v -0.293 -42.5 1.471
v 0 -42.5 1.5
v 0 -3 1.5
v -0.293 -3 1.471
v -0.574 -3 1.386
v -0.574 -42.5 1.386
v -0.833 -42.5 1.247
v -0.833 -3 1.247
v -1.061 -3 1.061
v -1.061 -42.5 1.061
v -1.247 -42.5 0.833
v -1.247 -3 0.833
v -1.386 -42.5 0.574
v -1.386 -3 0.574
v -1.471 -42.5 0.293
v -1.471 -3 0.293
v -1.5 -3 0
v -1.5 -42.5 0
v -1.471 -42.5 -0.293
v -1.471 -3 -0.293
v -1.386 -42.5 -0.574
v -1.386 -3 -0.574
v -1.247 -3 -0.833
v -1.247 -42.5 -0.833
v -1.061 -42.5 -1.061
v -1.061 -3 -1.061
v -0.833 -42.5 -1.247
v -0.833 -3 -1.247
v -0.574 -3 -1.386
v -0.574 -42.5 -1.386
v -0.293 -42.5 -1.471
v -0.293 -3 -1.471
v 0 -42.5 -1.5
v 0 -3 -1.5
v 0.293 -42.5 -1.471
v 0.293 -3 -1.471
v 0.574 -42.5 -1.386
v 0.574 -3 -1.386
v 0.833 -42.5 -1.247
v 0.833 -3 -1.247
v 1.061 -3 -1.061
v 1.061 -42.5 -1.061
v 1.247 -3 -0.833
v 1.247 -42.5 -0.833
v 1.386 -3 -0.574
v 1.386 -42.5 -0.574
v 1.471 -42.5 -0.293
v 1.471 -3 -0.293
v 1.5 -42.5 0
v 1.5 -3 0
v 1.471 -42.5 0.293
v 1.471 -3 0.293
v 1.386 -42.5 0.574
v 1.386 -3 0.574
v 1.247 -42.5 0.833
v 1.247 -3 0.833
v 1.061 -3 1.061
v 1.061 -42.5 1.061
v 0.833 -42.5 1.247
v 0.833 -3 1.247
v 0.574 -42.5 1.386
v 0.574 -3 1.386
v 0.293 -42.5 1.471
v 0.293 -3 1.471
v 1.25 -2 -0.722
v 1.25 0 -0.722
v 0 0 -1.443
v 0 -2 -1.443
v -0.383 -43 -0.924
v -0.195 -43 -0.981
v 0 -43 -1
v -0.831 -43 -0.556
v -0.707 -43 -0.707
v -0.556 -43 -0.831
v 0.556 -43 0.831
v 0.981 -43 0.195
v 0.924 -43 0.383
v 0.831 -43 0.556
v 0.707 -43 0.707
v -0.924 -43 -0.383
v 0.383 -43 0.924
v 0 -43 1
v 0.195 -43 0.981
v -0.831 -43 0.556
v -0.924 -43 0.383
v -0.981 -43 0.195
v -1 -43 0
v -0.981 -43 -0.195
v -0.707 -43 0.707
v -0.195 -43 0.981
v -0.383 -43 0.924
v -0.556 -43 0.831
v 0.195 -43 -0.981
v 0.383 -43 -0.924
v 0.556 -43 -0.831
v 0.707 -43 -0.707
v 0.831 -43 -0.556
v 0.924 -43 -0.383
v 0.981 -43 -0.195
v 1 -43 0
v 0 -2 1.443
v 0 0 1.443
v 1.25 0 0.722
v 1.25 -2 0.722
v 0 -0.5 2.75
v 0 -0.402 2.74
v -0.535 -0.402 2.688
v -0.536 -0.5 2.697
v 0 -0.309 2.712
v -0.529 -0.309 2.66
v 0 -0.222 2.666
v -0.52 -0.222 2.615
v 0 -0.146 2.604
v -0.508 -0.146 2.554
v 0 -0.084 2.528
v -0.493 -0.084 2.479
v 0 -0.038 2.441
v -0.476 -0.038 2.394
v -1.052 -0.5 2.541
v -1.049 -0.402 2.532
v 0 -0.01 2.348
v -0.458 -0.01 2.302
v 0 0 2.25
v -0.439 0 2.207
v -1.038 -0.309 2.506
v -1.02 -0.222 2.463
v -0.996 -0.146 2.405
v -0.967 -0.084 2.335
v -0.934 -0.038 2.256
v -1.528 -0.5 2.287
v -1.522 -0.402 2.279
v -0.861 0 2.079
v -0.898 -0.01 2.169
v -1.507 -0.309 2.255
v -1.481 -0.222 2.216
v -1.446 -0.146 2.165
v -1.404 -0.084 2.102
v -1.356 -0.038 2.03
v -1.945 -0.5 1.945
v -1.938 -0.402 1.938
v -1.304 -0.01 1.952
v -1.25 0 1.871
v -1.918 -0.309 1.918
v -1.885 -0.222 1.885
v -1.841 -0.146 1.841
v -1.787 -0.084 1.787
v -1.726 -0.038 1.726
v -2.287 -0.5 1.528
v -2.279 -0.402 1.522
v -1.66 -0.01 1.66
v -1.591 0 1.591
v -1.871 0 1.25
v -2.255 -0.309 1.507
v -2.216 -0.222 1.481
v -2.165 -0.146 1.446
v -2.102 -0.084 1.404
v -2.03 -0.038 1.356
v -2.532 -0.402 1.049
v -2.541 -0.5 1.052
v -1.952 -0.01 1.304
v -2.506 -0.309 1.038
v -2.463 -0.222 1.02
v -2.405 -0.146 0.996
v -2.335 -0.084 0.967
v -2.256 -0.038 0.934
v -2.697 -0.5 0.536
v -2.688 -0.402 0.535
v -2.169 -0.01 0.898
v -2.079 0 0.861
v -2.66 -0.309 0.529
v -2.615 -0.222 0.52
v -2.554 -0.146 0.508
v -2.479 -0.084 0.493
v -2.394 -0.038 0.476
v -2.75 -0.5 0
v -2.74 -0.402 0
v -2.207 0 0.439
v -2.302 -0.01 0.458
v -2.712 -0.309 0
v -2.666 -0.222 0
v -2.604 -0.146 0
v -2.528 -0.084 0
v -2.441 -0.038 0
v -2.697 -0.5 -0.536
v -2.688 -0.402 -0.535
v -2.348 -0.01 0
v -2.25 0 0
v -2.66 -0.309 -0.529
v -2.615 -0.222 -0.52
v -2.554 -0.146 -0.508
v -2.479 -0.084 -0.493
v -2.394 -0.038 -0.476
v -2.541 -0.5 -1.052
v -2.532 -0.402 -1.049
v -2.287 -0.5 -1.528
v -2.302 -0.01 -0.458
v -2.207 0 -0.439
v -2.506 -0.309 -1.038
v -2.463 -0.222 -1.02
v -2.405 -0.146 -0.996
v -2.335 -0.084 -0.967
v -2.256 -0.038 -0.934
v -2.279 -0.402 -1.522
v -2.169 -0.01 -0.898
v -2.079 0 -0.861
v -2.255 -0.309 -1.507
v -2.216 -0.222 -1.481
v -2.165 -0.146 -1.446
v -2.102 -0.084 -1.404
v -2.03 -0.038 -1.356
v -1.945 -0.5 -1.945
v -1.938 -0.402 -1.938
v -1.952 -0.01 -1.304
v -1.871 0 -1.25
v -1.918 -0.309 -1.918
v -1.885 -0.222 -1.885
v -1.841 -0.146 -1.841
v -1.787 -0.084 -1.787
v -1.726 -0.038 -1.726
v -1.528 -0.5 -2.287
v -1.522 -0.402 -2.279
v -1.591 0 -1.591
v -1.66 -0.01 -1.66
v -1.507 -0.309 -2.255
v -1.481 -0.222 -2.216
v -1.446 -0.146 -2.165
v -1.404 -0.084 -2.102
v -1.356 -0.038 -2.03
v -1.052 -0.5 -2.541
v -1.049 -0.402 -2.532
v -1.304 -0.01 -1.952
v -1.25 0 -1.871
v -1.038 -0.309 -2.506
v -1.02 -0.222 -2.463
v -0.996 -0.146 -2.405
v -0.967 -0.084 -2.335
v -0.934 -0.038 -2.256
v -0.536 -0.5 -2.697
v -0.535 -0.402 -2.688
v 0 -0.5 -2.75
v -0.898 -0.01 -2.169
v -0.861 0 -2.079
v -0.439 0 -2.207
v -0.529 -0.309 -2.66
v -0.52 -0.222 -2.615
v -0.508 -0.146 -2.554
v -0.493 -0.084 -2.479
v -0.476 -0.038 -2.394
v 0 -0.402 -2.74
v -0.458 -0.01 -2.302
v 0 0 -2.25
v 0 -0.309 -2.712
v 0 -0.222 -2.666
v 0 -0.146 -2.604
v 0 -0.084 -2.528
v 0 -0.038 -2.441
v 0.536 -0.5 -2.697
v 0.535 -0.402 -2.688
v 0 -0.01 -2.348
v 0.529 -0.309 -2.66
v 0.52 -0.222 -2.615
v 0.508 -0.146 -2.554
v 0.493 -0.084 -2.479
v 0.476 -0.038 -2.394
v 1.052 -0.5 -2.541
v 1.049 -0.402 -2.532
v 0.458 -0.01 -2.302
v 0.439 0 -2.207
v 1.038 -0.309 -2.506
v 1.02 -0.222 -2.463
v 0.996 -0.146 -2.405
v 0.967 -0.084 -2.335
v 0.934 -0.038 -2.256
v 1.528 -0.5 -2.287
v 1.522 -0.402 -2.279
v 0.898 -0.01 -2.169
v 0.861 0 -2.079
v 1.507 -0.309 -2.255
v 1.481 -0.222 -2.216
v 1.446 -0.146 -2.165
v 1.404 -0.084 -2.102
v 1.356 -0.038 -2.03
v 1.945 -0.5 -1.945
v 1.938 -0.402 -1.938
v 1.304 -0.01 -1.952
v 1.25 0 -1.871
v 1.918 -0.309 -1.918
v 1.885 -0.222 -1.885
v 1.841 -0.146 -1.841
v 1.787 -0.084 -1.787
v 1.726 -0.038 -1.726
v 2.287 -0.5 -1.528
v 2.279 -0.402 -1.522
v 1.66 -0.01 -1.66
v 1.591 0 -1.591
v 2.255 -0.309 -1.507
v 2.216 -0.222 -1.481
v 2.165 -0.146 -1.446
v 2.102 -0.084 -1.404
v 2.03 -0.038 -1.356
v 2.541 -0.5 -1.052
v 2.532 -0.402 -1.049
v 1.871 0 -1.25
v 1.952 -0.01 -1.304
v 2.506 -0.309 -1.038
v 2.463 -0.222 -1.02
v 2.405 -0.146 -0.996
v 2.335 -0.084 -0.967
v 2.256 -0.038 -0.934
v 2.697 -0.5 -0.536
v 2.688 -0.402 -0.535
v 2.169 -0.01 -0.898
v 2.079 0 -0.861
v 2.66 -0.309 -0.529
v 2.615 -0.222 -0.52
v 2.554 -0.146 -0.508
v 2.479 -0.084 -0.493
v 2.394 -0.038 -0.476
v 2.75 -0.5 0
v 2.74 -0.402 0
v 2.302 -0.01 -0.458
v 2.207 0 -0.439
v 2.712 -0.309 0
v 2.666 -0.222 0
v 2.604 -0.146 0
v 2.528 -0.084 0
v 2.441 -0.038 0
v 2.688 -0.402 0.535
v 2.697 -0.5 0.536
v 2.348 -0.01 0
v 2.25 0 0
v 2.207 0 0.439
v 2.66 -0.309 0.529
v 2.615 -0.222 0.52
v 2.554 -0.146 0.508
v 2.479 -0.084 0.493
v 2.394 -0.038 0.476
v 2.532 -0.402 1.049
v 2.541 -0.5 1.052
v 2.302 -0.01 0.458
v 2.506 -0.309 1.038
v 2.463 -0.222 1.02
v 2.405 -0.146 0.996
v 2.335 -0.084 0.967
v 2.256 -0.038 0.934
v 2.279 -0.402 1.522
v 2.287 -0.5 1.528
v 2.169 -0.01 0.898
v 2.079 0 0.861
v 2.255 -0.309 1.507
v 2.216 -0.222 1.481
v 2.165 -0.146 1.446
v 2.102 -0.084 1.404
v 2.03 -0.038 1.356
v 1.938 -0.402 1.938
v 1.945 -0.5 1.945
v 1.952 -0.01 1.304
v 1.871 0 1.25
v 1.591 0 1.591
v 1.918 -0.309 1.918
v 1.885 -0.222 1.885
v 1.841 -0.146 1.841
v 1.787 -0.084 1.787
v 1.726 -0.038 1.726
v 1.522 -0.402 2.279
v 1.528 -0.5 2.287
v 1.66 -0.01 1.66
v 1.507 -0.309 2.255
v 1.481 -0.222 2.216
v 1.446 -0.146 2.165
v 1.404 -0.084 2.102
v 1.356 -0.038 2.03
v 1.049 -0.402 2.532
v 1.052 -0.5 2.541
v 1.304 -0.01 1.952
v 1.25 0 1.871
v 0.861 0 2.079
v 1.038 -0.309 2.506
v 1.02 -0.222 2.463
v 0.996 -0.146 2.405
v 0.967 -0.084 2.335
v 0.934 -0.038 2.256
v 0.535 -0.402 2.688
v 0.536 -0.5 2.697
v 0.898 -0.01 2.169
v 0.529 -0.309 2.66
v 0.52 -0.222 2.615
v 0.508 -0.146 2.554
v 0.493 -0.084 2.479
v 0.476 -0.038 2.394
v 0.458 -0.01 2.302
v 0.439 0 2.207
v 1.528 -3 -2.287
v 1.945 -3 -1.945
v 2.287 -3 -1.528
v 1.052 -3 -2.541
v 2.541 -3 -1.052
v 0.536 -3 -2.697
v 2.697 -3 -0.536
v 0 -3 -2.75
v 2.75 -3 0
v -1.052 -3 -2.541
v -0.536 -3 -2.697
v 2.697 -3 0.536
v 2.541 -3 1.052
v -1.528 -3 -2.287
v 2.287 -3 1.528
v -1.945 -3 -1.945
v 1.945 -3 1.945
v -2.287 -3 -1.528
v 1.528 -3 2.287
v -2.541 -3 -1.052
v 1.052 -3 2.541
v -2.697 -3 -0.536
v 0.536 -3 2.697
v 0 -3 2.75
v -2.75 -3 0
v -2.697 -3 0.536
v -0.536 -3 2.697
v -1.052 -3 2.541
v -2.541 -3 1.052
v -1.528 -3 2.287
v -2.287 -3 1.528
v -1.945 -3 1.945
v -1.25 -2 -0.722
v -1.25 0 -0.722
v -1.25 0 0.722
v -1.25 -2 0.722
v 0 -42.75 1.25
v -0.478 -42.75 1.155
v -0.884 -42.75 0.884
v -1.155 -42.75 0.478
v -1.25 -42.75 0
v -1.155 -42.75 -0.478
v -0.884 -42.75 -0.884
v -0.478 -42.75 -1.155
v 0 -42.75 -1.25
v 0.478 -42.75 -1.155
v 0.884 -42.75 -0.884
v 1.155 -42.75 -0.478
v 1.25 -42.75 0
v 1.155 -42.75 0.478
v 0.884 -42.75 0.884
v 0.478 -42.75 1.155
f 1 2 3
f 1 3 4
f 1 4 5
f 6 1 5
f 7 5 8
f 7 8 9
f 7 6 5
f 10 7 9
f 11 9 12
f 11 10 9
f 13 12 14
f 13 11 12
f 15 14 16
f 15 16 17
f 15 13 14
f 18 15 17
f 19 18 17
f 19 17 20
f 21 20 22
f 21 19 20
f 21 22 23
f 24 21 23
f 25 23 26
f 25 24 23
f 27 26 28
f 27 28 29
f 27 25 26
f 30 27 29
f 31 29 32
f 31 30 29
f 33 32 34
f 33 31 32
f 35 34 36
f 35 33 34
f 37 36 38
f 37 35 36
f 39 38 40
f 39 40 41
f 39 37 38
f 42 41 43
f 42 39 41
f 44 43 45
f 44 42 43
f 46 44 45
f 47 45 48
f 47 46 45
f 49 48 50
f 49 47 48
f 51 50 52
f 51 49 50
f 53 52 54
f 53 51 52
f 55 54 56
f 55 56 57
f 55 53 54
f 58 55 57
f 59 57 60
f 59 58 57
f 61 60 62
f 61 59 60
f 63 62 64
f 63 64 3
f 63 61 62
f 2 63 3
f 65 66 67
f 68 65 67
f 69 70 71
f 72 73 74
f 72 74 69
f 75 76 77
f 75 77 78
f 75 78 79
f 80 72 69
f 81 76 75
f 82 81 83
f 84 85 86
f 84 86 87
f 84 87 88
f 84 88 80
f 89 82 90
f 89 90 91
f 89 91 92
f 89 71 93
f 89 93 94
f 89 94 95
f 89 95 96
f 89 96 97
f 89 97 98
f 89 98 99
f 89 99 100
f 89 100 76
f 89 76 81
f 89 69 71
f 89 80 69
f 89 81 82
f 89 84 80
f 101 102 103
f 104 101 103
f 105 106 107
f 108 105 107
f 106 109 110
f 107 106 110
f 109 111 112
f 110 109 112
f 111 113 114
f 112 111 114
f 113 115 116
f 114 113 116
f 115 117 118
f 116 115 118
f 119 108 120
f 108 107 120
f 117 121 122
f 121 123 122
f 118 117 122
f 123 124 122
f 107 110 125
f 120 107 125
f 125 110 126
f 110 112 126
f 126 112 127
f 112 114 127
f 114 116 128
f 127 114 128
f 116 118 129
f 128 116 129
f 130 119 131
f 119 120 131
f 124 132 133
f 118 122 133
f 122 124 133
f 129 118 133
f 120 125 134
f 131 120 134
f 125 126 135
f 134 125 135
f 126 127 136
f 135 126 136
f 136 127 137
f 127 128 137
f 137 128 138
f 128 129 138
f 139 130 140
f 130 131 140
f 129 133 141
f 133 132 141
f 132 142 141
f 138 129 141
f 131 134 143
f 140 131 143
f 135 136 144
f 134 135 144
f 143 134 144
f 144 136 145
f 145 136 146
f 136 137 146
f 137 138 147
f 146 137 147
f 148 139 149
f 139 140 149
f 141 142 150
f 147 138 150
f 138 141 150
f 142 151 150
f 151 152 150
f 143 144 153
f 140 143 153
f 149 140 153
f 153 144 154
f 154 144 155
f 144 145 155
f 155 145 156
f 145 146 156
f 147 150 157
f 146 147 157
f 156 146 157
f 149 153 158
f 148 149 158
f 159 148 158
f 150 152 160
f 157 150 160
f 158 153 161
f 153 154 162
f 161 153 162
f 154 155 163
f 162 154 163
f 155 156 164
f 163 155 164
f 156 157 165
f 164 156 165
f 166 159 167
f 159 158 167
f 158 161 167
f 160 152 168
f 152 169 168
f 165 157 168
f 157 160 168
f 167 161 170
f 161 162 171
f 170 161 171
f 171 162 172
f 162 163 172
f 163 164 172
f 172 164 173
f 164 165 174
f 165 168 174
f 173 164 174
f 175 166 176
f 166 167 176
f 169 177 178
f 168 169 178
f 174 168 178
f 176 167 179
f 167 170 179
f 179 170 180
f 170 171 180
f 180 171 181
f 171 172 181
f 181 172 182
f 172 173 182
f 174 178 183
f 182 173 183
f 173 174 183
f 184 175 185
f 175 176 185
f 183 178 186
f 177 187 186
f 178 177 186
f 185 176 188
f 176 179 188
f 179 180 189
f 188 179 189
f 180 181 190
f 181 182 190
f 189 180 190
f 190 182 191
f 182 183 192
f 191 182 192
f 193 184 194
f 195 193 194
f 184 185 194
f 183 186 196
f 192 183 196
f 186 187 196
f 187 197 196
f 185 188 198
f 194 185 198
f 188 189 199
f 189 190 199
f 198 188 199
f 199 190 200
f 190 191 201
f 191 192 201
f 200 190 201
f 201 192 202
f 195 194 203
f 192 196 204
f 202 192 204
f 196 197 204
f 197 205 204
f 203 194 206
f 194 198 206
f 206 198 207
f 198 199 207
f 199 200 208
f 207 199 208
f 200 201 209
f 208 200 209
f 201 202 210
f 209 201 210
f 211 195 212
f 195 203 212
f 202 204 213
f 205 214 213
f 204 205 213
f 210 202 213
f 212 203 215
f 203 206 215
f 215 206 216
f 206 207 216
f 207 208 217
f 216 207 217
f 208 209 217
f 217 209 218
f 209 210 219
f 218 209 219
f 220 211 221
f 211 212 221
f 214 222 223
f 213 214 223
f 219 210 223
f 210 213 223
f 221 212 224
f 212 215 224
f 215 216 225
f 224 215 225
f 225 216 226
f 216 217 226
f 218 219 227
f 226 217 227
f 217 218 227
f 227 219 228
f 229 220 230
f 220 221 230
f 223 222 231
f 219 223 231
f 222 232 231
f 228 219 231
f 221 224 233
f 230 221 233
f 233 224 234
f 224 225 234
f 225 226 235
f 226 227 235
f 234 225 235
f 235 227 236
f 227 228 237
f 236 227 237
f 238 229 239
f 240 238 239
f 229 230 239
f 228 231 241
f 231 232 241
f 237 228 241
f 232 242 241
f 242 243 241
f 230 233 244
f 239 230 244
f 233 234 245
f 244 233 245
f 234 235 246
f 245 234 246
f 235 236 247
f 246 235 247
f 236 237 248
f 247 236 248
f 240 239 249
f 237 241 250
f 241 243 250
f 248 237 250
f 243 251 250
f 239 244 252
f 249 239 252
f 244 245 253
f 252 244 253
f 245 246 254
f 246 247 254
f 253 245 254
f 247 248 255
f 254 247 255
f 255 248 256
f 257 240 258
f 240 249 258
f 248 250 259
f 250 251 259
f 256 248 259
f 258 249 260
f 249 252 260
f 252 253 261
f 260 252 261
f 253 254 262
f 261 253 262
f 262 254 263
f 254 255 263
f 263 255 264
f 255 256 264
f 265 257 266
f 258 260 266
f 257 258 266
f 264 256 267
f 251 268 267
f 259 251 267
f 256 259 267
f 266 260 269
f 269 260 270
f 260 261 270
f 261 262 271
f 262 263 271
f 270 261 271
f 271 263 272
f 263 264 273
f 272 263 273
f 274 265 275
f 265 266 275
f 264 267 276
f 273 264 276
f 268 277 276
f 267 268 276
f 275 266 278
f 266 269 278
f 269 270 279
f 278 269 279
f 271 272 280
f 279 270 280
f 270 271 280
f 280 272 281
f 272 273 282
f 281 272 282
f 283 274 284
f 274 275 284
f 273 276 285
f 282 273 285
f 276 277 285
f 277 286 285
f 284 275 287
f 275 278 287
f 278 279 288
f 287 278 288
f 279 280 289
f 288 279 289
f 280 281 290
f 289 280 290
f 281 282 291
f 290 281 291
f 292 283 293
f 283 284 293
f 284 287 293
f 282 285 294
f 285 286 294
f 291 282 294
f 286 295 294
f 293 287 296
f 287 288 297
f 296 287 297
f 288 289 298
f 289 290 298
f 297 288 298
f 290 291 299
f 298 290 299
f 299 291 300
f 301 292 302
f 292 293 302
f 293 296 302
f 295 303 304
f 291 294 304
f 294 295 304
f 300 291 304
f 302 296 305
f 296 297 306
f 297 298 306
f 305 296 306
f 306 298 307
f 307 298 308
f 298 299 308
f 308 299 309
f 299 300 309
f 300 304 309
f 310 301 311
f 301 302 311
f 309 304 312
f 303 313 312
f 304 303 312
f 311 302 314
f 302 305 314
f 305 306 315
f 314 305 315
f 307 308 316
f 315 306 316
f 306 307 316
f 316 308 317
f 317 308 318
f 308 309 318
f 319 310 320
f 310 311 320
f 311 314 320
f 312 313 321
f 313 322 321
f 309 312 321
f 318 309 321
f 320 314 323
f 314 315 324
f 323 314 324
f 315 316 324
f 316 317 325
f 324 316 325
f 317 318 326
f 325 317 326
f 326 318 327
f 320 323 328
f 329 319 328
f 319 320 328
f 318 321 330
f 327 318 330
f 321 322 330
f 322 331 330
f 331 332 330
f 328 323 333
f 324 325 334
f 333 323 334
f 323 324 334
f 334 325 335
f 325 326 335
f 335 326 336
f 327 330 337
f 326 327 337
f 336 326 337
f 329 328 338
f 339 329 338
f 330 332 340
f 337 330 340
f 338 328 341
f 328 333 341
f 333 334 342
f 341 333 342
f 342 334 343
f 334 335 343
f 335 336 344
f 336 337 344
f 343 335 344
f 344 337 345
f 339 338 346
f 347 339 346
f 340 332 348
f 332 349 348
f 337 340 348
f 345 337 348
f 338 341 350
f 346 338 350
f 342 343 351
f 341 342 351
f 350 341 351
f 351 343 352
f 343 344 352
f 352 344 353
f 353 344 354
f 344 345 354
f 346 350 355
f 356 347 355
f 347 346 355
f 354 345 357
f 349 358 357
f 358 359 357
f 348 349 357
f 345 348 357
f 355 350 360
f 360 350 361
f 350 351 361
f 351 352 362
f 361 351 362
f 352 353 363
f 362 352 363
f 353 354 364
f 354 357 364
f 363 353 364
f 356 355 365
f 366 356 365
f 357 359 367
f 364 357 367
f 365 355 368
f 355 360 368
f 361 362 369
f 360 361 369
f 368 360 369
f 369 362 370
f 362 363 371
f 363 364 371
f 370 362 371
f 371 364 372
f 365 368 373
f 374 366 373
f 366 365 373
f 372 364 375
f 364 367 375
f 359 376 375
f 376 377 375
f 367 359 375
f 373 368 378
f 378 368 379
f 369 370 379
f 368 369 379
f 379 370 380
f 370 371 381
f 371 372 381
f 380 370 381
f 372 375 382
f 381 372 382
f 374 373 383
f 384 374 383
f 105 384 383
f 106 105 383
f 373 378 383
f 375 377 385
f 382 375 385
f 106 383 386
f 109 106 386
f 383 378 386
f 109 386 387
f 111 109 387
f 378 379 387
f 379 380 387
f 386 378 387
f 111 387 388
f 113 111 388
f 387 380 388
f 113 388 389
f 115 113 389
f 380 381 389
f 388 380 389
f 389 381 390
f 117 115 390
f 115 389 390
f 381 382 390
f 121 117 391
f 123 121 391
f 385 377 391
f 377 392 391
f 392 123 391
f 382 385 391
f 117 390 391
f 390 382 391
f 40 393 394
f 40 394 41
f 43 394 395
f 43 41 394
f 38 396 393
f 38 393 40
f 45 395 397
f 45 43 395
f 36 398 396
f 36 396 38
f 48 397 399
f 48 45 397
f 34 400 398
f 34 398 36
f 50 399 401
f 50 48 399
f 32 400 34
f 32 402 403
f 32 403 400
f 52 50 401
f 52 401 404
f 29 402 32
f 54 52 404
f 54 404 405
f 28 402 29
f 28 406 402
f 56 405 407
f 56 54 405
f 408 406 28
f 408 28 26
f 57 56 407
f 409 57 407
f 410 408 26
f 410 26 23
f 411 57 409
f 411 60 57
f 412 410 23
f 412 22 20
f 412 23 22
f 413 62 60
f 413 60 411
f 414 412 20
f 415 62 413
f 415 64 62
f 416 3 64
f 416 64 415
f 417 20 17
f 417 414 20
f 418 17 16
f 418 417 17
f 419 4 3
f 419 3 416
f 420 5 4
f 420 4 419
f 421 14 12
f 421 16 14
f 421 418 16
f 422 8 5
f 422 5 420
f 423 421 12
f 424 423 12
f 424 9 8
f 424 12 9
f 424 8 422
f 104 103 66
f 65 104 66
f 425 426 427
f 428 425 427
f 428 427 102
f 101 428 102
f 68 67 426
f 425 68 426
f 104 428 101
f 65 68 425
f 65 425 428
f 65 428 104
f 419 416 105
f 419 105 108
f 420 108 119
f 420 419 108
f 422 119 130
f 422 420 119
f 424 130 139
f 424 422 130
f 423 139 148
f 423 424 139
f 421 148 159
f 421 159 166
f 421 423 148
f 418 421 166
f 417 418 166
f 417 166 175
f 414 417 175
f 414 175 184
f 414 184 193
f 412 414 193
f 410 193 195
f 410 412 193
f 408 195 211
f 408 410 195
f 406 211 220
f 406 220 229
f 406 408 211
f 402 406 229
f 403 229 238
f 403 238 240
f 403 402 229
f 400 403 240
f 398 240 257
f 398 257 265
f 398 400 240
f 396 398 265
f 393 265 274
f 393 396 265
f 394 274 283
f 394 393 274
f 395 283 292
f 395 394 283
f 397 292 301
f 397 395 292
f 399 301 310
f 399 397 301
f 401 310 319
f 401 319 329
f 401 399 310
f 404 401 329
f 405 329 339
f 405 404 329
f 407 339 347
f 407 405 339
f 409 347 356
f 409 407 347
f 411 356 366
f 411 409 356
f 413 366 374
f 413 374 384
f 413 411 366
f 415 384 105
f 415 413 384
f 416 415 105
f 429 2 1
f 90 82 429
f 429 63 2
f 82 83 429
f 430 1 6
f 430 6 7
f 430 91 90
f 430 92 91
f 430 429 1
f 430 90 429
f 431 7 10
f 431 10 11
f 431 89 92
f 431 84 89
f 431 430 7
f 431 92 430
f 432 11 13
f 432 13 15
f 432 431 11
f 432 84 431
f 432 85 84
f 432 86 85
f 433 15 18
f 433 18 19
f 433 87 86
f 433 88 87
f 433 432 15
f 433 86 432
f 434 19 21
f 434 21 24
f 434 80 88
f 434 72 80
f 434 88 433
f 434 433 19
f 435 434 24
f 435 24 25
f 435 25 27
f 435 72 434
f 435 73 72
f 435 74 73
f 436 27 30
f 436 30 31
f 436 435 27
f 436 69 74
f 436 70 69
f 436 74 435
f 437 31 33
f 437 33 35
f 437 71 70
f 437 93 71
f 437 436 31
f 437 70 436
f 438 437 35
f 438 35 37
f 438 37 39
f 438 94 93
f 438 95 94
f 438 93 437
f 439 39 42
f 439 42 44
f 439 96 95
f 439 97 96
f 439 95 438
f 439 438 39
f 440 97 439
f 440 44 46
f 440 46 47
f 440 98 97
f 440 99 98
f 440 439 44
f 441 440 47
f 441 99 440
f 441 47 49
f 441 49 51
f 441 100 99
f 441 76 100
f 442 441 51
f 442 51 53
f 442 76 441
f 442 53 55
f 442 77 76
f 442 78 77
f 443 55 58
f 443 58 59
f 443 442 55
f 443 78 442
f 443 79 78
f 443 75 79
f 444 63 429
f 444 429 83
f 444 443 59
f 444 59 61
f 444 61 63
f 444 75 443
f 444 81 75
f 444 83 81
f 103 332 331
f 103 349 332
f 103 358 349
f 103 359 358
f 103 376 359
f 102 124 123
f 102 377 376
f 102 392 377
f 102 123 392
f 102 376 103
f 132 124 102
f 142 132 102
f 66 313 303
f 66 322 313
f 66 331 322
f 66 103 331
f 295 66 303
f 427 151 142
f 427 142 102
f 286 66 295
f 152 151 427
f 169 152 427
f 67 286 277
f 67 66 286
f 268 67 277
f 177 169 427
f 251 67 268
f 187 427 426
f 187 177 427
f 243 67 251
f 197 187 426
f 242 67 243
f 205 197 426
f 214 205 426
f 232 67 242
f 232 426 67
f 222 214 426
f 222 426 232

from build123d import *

# Parameters (mm, degrees)
CORTAR_EXTRUIR1_DEPTH = 2
CHAFL_N1_SIZE         = 0.5
REDONDEO1_R           = 0.5


with BuildPart() as part:
    # Croquis1 → Revolución1 (revolve)
    with BuildSketch(Plane.XY, mode=Mode.PRIVATE) as revoluci_n1_sk:
        Polygon((0, 0), (2.75, 0), (2.75, -3), (1.5, -3), (1.5, -43), (0, -43), align=None)
    revolve(revoluci_n1_sk.sketch.rotate(Axis((0, 0, 0), (0, -1, 0)), 90), axis=Axis((0, 0, 0), (0, -1, 0)))

    # Croquis2 → Cortar-Extruir1 (cut)
    with BuildSketch(Plane(origin=(0, 0, 0), x_dir=(1, 0, 0), z_dir=(0, 1, 0))):
        Polygon((1.25, 0.721687836), (0, 1.443375673), (-1.25, 0.721687836), (-1.25, -0.721687836), (0, -1.443375673), (1.25, -0.721687836), align=None)
    extrude(amount=-CORTAR_EXTRUIR1_DEPTH, mode=Mode.SUBTRACT)

    # Chaflán1
    chafl_n1_edges = [part.edges().sort_by_distance(p)[0] for p in [
        (0, -43, -1.5),
    ]]
    chamfer(chafl_n1_edges, length=CHAFL_N1_SIZE)

    # Redondeo1
    redondeo1_edges = [part.edges().sort_by_distance(p)[0] for p in [
        (0, 0, -2.75),
    ]]
    fillet(redondeo1_edges, radius=REDONDEO1_R)


solid = part.part
